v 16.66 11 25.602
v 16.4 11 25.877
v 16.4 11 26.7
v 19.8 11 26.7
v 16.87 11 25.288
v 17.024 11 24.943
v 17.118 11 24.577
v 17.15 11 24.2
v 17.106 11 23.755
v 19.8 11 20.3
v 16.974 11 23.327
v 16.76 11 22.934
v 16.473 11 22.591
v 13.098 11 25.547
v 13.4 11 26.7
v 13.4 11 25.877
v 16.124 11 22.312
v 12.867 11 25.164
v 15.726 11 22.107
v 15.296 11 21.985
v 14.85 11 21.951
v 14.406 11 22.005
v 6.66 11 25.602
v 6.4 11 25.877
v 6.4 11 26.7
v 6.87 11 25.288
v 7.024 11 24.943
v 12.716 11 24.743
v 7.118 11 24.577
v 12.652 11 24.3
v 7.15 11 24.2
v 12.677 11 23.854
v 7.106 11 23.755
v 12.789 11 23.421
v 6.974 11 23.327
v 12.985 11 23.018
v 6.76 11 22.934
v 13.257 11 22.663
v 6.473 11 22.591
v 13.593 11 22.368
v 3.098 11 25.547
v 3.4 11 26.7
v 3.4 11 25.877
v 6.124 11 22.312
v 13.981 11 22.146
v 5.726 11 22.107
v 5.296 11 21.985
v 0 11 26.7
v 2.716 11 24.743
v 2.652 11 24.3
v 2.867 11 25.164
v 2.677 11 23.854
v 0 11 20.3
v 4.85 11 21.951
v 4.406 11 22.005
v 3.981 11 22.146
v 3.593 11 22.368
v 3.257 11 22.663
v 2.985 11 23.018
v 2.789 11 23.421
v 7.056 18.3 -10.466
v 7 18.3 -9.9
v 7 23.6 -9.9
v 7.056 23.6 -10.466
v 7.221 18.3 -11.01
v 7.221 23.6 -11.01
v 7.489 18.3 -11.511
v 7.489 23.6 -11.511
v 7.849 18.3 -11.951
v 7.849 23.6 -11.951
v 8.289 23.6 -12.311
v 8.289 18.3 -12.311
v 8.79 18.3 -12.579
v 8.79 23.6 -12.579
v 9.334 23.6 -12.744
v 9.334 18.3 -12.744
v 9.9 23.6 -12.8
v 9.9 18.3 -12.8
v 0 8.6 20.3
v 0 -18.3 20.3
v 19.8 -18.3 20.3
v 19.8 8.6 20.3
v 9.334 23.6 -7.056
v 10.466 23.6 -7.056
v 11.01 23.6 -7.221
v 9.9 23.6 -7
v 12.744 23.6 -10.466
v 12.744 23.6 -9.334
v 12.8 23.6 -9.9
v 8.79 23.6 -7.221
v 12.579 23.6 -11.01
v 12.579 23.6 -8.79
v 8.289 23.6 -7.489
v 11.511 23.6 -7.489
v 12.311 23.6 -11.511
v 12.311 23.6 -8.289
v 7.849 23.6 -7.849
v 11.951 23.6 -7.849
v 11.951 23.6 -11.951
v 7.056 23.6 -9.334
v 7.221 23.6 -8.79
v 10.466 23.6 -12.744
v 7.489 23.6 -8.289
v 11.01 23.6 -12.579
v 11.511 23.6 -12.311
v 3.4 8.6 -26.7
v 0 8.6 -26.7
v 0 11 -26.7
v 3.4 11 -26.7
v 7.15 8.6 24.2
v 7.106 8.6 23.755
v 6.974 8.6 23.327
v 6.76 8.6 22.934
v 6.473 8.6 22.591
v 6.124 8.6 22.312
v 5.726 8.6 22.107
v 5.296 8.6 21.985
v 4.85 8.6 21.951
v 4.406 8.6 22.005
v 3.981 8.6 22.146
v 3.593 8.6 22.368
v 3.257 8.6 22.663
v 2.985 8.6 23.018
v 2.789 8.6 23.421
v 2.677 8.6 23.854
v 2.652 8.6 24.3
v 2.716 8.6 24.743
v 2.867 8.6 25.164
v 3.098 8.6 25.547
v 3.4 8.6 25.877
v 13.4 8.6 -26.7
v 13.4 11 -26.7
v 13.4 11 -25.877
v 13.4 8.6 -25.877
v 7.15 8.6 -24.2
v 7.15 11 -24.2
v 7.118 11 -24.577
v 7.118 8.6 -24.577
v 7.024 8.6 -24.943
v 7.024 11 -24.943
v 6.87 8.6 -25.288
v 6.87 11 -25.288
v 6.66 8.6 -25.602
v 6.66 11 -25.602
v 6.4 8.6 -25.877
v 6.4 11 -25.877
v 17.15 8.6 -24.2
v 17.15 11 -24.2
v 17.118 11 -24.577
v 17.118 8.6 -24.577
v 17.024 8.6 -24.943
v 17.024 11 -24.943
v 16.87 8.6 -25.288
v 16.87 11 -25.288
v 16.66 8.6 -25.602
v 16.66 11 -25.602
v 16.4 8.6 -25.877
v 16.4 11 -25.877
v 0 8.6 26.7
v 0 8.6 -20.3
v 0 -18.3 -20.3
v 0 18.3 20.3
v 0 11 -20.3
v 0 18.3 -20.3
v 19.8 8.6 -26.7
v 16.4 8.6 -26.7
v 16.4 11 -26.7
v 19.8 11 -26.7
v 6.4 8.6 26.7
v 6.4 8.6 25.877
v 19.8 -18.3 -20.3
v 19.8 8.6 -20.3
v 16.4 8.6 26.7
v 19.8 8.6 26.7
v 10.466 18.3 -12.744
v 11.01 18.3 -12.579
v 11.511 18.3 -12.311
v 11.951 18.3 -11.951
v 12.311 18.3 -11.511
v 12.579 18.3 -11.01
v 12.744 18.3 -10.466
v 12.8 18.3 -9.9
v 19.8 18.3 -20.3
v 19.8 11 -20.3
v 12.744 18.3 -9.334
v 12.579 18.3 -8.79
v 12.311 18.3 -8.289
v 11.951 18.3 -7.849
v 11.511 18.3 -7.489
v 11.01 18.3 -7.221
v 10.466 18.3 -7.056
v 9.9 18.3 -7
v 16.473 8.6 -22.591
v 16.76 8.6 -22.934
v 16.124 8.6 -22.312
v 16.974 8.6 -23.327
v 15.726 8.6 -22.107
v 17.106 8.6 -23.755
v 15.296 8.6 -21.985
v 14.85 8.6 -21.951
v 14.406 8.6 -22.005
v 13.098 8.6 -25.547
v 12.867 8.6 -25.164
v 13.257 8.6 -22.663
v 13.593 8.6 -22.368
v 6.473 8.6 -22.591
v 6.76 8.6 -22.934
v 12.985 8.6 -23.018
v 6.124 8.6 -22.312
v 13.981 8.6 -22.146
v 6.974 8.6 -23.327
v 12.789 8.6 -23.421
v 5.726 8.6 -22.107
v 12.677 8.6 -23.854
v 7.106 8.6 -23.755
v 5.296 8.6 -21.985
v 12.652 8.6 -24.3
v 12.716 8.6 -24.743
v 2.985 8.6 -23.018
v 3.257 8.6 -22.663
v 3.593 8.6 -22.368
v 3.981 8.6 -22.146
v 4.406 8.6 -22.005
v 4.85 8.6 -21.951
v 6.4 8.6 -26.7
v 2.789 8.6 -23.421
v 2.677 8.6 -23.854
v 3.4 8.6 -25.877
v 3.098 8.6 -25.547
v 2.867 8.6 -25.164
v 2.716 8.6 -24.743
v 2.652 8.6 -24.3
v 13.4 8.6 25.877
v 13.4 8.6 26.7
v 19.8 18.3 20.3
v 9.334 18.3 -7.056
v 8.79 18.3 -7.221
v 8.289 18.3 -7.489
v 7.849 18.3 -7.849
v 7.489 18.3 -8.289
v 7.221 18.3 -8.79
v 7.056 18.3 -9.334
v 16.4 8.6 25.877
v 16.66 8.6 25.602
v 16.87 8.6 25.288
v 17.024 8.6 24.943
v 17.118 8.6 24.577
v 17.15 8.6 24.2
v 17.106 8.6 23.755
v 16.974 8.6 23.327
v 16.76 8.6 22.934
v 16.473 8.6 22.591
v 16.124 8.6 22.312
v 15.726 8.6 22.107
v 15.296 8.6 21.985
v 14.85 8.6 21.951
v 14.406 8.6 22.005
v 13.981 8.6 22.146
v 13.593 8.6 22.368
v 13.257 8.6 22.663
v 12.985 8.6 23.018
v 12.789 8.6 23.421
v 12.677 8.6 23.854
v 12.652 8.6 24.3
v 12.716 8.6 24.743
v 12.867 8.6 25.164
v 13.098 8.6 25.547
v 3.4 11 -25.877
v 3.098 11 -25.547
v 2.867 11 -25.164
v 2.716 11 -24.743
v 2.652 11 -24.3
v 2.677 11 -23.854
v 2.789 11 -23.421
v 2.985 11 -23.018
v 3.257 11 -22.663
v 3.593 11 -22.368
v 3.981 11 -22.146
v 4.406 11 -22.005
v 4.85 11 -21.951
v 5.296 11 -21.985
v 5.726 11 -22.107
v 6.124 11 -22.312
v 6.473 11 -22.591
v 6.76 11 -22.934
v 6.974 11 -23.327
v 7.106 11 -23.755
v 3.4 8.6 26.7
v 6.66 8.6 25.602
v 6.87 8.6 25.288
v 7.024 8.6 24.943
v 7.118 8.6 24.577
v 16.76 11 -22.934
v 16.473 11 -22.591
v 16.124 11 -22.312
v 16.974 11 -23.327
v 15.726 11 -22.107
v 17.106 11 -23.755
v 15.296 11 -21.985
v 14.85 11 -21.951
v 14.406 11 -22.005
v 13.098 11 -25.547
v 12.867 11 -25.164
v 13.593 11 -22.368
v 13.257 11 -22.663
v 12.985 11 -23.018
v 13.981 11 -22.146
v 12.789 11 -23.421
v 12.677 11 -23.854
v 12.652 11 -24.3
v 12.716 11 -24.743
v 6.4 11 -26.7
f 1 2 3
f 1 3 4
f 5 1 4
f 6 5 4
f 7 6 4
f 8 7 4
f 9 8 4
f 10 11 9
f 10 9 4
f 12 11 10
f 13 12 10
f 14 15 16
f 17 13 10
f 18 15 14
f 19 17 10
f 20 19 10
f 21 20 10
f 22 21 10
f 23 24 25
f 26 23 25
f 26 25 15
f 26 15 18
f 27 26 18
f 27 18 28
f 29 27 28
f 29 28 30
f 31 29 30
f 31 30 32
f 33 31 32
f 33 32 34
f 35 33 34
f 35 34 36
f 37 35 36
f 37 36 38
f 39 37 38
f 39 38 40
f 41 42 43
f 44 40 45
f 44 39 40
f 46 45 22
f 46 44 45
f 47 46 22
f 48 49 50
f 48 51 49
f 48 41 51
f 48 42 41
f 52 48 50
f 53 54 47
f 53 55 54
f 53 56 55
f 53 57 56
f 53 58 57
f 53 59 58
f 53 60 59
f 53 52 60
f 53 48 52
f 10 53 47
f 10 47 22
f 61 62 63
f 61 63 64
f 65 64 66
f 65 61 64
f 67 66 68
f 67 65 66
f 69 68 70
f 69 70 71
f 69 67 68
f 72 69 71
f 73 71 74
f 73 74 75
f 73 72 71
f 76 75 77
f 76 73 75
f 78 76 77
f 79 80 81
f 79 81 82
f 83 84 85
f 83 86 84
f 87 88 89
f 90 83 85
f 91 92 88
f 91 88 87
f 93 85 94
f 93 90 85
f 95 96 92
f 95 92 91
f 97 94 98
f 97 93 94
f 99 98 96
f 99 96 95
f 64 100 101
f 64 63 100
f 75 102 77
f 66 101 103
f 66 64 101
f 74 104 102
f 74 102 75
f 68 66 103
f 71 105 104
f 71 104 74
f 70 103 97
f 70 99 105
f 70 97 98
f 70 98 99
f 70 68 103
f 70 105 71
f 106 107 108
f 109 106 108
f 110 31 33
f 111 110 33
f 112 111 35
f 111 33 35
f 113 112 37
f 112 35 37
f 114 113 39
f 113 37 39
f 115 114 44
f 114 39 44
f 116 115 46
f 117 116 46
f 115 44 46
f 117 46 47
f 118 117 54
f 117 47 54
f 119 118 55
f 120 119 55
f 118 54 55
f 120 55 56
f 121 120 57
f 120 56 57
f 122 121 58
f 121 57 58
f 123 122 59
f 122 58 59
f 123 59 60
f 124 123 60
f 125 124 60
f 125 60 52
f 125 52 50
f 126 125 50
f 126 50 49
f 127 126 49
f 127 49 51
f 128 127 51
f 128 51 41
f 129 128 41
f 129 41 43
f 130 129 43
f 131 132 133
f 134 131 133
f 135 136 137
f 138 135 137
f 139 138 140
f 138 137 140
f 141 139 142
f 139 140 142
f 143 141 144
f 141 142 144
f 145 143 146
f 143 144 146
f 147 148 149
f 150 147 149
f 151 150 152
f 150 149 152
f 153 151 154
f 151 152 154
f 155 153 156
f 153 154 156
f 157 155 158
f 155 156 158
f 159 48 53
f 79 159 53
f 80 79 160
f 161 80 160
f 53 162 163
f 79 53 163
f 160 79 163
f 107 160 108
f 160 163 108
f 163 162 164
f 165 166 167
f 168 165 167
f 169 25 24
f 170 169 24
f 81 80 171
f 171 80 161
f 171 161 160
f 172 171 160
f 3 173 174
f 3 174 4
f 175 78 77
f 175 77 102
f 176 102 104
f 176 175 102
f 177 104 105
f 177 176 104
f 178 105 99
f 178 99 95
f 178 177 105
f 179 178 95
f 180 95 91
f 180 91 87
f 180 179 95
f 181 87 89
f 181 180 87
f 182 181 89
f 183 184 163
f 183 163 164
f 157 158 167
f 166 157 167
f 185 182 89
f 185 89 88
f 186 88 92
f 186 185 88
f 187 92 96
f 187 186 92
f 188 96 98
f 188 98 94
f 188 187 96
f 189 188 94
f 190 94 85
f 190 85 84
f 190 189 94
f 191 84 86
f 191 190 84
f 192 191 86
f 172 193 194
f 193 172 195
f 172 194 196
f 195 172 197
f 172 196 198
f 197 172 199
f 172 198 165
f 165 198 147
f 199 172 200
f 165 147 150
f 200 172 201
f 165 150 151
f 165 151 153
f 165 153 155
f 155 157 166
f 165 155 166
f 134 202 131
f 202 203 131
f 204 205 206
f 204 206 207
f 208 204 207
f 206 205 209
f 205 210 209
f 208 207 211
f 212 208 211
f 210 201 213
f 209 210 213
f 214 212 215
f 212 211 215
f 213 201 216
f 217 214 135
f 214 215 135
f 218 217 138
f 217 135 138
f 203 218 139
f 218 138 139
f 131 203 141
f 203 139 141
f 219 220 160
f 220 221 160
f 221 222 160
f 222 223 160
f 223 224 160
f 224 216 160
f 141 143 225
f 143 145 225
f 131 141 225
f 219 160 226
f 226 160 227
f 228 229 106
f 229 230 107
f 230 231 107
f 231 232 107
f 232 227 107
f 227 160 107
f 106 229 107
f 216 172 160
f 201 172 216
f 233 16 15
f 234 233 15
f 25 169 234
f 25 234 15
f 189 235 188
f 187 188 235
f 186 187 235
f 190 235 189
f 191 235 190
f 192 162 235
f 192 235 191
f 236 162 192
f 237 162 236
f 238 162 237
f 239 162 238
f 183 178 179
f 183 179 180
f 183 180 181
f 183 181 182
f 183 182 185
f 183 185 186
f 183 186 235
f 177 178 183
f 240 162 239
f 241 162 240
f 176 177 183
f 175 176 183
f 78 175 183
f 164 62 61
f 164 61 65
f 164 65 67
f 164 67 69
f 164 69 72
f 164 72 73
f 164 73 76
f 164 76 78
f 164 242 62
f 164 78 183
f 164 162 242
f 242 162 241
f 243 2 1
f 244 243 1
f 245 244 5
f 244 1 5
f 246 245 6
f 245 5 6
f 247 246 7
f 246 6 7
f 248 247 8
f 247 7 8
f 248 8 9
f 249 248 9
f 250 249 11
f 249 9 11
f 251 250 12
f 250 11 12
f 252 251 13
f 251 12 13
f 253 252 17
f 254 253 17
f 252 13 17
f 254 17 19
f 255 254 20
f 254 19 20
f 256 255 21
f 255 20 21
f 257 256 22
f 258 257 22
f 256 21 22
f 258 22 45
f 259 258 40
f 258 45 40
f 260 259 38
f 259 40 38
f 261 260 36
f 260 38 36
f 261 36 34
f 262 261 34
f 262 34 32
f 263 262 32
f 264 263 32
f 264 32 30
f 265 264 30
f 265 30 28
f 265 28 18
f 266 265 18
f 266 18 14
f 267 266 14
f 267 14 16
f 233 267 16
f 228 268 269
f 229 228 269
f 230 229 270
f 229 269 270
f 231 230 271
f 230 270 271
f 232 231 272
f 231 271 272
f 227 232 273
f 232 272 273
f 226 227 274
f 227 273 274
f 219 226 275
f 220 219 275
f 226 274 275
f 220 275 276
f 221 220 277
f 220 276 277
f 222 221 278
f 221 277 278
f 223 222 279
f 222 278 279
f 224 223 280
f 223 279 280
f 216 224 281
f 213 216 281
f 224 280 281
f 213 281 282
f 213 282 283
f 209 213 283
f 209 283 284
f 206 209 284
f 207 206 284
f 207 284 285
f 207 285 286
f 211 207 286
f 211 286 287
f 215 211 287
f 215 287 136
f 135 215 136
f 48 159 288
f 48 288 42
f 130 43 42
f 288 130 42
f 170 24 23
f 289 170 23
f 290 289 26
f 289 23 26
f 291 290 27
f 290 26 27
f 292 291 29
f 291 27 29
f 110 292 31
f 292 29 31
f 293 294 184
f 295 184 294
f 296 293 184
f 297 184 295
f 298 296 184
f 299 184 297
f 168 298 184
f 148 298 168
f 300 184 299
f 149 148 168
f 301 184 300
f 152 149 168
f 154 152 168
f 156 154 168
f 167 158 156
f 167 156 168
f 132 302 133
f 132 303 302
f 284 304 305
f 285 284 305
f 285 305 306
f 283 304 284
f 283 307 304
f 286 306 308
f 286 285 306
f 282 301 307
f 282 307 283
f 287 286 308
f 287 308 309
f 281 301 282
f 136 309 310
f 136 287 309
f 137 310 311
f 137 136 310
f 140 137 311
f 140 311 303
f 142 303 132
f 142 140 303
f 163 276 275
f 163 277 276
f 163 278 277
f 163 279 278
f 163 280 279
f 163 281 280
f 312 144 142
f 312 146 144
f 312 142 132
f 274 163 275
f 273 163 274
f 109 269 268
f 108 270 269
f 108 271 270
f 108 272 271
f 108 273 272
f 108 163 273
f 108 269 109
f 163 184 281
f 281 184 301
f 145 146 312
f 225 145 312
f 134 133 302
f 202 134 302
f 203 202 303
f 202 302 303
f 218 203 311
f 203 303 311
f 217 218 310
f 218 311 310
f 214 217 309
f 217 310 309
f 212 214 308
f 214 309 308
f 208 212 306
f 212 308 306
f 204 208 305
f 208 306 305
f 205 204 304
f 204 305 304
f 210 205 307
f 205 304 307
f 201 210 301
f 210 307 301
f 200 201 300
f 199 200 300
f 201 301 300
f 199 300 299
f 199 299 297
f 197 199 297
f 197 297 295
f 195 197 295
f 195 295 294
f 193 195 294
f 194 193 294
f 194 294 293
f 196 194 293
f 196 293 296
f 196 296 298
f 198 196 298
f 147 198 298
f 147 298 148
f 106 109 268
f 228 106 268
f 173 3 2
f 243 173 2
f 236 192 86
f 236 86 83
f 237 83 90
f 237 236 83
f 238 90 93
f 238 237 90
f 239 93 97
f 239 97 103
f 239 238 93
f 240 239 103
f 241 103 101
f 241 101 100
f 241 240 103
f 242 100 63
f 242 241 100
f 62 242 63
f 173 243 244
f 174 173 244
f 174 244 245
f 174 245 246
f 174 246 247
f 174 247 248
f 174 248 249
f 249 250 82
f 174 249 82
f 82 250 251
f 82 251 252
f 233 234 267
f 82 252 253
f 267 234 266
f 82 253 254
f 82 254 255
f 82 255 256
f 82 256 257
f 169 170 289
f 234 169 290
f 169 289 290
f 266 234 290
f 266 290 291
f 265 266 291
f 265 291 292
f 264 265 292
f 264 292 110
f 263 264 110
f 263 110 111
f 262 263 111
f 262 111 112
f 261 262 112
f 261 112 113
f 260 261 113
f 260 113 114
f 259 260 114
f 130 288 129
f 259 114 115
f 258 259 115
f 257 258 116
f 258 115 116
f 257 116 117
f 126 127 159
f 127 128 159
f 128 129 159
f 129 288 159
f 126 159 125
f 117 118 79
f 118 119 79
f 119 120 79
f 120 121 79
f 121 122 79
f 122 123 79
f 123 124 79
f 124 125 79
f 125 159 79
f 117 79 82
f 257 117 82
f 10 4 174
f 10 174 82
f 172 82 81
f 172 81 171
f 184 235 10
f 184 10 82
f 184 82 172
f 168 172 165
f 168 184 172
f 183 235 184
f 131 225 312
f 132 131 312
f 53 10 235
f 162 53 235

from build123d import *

# Parameters (mm, degrees)
SKETCH2_W           = 40.6
SKETCH2_H           = 36.6
SKETCH2_W_2         = 6.4
SKETCH2_H_2         = 2.4
SKETCH2_W_3         = 5.8
SKETCH2_H_3         = 5.3
BOSS_EXTRUDE1_DEPTH = 19.8
CUT_EXTRUDE1_DEPTH  = 5.3
CUT_EXTRUDE2_DEPTH  = 30.3


with BuildPart() as part:
    # Sketch2 → Boss-Extrude1 (new body)
    with BuildSketch(Plane(origin=(0, 0, 0), x_dir=(0, 0, -1), z_dir=(1, 0, 0))):
        Rectangle(SKETCH2_W, SKETCH2_H)
        with Locations((-23.5, 9.8)):
            Rectangle(SKETCH2_W_2, SKETCH2_H_2)
        with Locations((9.9, 20.95)):
            Rectangle(SKETCH2_W_3, SKETCH2_H_3)
        with Locations((23.5, 9.8)):
            Rectangle(SKETCH2_W_2, SKETCH2_H_2)
    extrude(amount=BOSS_EXTRUDE1_DEPTH)

    # Sketch3 → Cut-Extrude1 (cut)
    with BuildSketch(Plane(origin=(0, 18.3, 0), x_dir=(1, 0, 0), z_dir=(0, 1, 0))):
        with BuildLine():
            Line((9.9, 7), (12.8, 7))
            Line((12.8, 7), (12.8, 9.9))
            ThreePointArc((12.8, 9.9), (11.950609665, 7.849390335), (9.9, 7))
        make_face()
        with BuildLine():
            ThreePointArc((9.9, 12.8), (11.950609665, 11.950609665), (12.8, 9.9))
            Line((12.8, 9.9), (12.8, 12.8))
            Line((12.8, 12.8), (9.9, 12.8))
        make_face()
        with BuildLine():
            ThreePointArc((7, 9.9), (7.849390335, 11.950609665), (9.9, 12.8))
            Line((9.9, 12.8), (7, 12.8))
            Line((7, 12.8), (7, 9.9))
        make_face()
        with BuildLine():
            Line((7, 7), (9.9, 7))
            ThreePointArc((9.9, 7), (7.849390335, 7.849390335), (7, 9.9))
            Line((7, 9.9), (7, 7))
        make_face()
        Polygon((0, 7), (7, 7), (7, 9.9), (7, 12.8), (0, 12.8), align=None)
        Polygon((12.8, 7), (19.8, 7), (19.8, 12.8), (12.8, 12.8), (12.8, 9.9), align=None)
    extrude(amount=CUT_EXTRUDE1_DEPTH, mode=Mode.SUBTRACT)

    # Sketch4 → Cut-Extrude2 (cut, through all)
    with BuildSketch(Plane(origin=(0, 11, 0), x_dir=(1, 0, 0), z_dir=(0, 1, 0))):
        with BuildLine():
            ThreePointArc((16.4, 25.877050983), (14.9, 26.45), (13.4, 25.877050983))
            Line((13.4, 25.877050983), (16.4, 25.877050983))
        make_face()
        with BuildLine():
            Line((16.4, 25.877050983), (13.4, 25.877050983))
            ThreePointArc((13.4, 25.877050983), (13.981441346, 22.146040409), (17.15, 24.2))
            ThreePointArc((17.15, 24.2), (16.953959591, 25.118558654), (16.4, 25.877050983))
        make_face()
        with BuildLine():
            Line((16.4, 26.7), (13.4, 26.7))
            Line((13.4, 26.7), (13.4, 25.877050983))
            ThreePointArc((13.4, 25.877050983), (14.9, 26.45), (16.4, 25.877050983))
            Line((16.4, 25.877050983), (16.4, 26.7))
        make_face()
        with BuildLine():
            ThreePointArc((7.15, 24.2), (6.953959591, 25.118558654), (6.4, 25.877050983))
            Line((6.4, 25.877050983), (3.4, 25.877050983))
            ThreePointArc((3.4, 25.877050983), (3.981441346, 22.146040409), (7.15, 24.2))
        make_face()
        with BuildLine():
            Line((3.4, 25.877050983), (6.4, 25.877050983))
            ThreePointArc((6.4, 25.877050983), (4.9, 26.45), (3.4, 25.877050983))
        make_face()
        with BuildLine():
            Line((6.4, 25.877050983), (6.4, 26.7))
            Line((6.4, 26.7), (3.4, 26.7))
            Line((3.4, 26.7), (3.4, 25.877050983))
            ThreePointArc((3.4, 25.877050983), (4.9, 26.45), (6.4, 25.877050983))
        make_face()
        with BuildLine():
            ThreePointArc((13.4, -25.877050983), (14.9, -26.45), (16.4, -25.877050983))
            Line((16.4, -25.877050983), (13.4, -25.877050983))
        make_face()
        with BuildLine():
            Line((13.4, -25.877050983), (16.4, -25.877050983))
            ThreePointArc((16.4, -25.877050983), (16.953959591, -25.118558654), (17.15, -24.2))
            ThreePointArc((17.15, -24.2), (13.981441346, -22.146040409), (13.4, -25.877050983))
        make_face()
        with BuildLine():
            Line((13.4, -26.7), (16.4, -26.7))
            Line((16.4, -26.7), (16.4, -25.877050983))
            ThreePointArc((16.4, -25.877050983), (14.9, -26.45), (13.4, -25.877050983))
            Line((13.4, -25.877050983), (13.4, -26.7))
        make_face()
        with BuildLine():
            ThreePointArc((3.4, -25.877050983), (4.9, -26.45), (6.4, -25.877050983))
            Line((6.4, -25.877050983), (3.4, -25.877050983))
        make_face()
        with BuildLine():
            Line((3.4, -25.877050983), (6.4, -25.877050983))
            ThreePointArc((6.4, -25.877050983), (6.953959591, -25.118558654), (7.15, -24.2))
            ThreePointArc((7.15, -24.2), (3.981441346, -22.146040409), (3.4, -25.877050983))
        make_face()
        with BuildLine():
            Line((3.4, -26.7), (6.4, -26.7))
            Line((6.4, -26.7), (6.4, -25.877050983))
            ThreePointArc((6.4, -25.877050983), (4.9, -26.45), (3.4, -25.877050983))
            Line((3.4, -25.877050983), (3.4, -26.7))
        make_face()
    extrude(amount=-CUT_EXTRUDE2_DEPTH, mode=Mode.SUBTRACT)


solid = part.part
